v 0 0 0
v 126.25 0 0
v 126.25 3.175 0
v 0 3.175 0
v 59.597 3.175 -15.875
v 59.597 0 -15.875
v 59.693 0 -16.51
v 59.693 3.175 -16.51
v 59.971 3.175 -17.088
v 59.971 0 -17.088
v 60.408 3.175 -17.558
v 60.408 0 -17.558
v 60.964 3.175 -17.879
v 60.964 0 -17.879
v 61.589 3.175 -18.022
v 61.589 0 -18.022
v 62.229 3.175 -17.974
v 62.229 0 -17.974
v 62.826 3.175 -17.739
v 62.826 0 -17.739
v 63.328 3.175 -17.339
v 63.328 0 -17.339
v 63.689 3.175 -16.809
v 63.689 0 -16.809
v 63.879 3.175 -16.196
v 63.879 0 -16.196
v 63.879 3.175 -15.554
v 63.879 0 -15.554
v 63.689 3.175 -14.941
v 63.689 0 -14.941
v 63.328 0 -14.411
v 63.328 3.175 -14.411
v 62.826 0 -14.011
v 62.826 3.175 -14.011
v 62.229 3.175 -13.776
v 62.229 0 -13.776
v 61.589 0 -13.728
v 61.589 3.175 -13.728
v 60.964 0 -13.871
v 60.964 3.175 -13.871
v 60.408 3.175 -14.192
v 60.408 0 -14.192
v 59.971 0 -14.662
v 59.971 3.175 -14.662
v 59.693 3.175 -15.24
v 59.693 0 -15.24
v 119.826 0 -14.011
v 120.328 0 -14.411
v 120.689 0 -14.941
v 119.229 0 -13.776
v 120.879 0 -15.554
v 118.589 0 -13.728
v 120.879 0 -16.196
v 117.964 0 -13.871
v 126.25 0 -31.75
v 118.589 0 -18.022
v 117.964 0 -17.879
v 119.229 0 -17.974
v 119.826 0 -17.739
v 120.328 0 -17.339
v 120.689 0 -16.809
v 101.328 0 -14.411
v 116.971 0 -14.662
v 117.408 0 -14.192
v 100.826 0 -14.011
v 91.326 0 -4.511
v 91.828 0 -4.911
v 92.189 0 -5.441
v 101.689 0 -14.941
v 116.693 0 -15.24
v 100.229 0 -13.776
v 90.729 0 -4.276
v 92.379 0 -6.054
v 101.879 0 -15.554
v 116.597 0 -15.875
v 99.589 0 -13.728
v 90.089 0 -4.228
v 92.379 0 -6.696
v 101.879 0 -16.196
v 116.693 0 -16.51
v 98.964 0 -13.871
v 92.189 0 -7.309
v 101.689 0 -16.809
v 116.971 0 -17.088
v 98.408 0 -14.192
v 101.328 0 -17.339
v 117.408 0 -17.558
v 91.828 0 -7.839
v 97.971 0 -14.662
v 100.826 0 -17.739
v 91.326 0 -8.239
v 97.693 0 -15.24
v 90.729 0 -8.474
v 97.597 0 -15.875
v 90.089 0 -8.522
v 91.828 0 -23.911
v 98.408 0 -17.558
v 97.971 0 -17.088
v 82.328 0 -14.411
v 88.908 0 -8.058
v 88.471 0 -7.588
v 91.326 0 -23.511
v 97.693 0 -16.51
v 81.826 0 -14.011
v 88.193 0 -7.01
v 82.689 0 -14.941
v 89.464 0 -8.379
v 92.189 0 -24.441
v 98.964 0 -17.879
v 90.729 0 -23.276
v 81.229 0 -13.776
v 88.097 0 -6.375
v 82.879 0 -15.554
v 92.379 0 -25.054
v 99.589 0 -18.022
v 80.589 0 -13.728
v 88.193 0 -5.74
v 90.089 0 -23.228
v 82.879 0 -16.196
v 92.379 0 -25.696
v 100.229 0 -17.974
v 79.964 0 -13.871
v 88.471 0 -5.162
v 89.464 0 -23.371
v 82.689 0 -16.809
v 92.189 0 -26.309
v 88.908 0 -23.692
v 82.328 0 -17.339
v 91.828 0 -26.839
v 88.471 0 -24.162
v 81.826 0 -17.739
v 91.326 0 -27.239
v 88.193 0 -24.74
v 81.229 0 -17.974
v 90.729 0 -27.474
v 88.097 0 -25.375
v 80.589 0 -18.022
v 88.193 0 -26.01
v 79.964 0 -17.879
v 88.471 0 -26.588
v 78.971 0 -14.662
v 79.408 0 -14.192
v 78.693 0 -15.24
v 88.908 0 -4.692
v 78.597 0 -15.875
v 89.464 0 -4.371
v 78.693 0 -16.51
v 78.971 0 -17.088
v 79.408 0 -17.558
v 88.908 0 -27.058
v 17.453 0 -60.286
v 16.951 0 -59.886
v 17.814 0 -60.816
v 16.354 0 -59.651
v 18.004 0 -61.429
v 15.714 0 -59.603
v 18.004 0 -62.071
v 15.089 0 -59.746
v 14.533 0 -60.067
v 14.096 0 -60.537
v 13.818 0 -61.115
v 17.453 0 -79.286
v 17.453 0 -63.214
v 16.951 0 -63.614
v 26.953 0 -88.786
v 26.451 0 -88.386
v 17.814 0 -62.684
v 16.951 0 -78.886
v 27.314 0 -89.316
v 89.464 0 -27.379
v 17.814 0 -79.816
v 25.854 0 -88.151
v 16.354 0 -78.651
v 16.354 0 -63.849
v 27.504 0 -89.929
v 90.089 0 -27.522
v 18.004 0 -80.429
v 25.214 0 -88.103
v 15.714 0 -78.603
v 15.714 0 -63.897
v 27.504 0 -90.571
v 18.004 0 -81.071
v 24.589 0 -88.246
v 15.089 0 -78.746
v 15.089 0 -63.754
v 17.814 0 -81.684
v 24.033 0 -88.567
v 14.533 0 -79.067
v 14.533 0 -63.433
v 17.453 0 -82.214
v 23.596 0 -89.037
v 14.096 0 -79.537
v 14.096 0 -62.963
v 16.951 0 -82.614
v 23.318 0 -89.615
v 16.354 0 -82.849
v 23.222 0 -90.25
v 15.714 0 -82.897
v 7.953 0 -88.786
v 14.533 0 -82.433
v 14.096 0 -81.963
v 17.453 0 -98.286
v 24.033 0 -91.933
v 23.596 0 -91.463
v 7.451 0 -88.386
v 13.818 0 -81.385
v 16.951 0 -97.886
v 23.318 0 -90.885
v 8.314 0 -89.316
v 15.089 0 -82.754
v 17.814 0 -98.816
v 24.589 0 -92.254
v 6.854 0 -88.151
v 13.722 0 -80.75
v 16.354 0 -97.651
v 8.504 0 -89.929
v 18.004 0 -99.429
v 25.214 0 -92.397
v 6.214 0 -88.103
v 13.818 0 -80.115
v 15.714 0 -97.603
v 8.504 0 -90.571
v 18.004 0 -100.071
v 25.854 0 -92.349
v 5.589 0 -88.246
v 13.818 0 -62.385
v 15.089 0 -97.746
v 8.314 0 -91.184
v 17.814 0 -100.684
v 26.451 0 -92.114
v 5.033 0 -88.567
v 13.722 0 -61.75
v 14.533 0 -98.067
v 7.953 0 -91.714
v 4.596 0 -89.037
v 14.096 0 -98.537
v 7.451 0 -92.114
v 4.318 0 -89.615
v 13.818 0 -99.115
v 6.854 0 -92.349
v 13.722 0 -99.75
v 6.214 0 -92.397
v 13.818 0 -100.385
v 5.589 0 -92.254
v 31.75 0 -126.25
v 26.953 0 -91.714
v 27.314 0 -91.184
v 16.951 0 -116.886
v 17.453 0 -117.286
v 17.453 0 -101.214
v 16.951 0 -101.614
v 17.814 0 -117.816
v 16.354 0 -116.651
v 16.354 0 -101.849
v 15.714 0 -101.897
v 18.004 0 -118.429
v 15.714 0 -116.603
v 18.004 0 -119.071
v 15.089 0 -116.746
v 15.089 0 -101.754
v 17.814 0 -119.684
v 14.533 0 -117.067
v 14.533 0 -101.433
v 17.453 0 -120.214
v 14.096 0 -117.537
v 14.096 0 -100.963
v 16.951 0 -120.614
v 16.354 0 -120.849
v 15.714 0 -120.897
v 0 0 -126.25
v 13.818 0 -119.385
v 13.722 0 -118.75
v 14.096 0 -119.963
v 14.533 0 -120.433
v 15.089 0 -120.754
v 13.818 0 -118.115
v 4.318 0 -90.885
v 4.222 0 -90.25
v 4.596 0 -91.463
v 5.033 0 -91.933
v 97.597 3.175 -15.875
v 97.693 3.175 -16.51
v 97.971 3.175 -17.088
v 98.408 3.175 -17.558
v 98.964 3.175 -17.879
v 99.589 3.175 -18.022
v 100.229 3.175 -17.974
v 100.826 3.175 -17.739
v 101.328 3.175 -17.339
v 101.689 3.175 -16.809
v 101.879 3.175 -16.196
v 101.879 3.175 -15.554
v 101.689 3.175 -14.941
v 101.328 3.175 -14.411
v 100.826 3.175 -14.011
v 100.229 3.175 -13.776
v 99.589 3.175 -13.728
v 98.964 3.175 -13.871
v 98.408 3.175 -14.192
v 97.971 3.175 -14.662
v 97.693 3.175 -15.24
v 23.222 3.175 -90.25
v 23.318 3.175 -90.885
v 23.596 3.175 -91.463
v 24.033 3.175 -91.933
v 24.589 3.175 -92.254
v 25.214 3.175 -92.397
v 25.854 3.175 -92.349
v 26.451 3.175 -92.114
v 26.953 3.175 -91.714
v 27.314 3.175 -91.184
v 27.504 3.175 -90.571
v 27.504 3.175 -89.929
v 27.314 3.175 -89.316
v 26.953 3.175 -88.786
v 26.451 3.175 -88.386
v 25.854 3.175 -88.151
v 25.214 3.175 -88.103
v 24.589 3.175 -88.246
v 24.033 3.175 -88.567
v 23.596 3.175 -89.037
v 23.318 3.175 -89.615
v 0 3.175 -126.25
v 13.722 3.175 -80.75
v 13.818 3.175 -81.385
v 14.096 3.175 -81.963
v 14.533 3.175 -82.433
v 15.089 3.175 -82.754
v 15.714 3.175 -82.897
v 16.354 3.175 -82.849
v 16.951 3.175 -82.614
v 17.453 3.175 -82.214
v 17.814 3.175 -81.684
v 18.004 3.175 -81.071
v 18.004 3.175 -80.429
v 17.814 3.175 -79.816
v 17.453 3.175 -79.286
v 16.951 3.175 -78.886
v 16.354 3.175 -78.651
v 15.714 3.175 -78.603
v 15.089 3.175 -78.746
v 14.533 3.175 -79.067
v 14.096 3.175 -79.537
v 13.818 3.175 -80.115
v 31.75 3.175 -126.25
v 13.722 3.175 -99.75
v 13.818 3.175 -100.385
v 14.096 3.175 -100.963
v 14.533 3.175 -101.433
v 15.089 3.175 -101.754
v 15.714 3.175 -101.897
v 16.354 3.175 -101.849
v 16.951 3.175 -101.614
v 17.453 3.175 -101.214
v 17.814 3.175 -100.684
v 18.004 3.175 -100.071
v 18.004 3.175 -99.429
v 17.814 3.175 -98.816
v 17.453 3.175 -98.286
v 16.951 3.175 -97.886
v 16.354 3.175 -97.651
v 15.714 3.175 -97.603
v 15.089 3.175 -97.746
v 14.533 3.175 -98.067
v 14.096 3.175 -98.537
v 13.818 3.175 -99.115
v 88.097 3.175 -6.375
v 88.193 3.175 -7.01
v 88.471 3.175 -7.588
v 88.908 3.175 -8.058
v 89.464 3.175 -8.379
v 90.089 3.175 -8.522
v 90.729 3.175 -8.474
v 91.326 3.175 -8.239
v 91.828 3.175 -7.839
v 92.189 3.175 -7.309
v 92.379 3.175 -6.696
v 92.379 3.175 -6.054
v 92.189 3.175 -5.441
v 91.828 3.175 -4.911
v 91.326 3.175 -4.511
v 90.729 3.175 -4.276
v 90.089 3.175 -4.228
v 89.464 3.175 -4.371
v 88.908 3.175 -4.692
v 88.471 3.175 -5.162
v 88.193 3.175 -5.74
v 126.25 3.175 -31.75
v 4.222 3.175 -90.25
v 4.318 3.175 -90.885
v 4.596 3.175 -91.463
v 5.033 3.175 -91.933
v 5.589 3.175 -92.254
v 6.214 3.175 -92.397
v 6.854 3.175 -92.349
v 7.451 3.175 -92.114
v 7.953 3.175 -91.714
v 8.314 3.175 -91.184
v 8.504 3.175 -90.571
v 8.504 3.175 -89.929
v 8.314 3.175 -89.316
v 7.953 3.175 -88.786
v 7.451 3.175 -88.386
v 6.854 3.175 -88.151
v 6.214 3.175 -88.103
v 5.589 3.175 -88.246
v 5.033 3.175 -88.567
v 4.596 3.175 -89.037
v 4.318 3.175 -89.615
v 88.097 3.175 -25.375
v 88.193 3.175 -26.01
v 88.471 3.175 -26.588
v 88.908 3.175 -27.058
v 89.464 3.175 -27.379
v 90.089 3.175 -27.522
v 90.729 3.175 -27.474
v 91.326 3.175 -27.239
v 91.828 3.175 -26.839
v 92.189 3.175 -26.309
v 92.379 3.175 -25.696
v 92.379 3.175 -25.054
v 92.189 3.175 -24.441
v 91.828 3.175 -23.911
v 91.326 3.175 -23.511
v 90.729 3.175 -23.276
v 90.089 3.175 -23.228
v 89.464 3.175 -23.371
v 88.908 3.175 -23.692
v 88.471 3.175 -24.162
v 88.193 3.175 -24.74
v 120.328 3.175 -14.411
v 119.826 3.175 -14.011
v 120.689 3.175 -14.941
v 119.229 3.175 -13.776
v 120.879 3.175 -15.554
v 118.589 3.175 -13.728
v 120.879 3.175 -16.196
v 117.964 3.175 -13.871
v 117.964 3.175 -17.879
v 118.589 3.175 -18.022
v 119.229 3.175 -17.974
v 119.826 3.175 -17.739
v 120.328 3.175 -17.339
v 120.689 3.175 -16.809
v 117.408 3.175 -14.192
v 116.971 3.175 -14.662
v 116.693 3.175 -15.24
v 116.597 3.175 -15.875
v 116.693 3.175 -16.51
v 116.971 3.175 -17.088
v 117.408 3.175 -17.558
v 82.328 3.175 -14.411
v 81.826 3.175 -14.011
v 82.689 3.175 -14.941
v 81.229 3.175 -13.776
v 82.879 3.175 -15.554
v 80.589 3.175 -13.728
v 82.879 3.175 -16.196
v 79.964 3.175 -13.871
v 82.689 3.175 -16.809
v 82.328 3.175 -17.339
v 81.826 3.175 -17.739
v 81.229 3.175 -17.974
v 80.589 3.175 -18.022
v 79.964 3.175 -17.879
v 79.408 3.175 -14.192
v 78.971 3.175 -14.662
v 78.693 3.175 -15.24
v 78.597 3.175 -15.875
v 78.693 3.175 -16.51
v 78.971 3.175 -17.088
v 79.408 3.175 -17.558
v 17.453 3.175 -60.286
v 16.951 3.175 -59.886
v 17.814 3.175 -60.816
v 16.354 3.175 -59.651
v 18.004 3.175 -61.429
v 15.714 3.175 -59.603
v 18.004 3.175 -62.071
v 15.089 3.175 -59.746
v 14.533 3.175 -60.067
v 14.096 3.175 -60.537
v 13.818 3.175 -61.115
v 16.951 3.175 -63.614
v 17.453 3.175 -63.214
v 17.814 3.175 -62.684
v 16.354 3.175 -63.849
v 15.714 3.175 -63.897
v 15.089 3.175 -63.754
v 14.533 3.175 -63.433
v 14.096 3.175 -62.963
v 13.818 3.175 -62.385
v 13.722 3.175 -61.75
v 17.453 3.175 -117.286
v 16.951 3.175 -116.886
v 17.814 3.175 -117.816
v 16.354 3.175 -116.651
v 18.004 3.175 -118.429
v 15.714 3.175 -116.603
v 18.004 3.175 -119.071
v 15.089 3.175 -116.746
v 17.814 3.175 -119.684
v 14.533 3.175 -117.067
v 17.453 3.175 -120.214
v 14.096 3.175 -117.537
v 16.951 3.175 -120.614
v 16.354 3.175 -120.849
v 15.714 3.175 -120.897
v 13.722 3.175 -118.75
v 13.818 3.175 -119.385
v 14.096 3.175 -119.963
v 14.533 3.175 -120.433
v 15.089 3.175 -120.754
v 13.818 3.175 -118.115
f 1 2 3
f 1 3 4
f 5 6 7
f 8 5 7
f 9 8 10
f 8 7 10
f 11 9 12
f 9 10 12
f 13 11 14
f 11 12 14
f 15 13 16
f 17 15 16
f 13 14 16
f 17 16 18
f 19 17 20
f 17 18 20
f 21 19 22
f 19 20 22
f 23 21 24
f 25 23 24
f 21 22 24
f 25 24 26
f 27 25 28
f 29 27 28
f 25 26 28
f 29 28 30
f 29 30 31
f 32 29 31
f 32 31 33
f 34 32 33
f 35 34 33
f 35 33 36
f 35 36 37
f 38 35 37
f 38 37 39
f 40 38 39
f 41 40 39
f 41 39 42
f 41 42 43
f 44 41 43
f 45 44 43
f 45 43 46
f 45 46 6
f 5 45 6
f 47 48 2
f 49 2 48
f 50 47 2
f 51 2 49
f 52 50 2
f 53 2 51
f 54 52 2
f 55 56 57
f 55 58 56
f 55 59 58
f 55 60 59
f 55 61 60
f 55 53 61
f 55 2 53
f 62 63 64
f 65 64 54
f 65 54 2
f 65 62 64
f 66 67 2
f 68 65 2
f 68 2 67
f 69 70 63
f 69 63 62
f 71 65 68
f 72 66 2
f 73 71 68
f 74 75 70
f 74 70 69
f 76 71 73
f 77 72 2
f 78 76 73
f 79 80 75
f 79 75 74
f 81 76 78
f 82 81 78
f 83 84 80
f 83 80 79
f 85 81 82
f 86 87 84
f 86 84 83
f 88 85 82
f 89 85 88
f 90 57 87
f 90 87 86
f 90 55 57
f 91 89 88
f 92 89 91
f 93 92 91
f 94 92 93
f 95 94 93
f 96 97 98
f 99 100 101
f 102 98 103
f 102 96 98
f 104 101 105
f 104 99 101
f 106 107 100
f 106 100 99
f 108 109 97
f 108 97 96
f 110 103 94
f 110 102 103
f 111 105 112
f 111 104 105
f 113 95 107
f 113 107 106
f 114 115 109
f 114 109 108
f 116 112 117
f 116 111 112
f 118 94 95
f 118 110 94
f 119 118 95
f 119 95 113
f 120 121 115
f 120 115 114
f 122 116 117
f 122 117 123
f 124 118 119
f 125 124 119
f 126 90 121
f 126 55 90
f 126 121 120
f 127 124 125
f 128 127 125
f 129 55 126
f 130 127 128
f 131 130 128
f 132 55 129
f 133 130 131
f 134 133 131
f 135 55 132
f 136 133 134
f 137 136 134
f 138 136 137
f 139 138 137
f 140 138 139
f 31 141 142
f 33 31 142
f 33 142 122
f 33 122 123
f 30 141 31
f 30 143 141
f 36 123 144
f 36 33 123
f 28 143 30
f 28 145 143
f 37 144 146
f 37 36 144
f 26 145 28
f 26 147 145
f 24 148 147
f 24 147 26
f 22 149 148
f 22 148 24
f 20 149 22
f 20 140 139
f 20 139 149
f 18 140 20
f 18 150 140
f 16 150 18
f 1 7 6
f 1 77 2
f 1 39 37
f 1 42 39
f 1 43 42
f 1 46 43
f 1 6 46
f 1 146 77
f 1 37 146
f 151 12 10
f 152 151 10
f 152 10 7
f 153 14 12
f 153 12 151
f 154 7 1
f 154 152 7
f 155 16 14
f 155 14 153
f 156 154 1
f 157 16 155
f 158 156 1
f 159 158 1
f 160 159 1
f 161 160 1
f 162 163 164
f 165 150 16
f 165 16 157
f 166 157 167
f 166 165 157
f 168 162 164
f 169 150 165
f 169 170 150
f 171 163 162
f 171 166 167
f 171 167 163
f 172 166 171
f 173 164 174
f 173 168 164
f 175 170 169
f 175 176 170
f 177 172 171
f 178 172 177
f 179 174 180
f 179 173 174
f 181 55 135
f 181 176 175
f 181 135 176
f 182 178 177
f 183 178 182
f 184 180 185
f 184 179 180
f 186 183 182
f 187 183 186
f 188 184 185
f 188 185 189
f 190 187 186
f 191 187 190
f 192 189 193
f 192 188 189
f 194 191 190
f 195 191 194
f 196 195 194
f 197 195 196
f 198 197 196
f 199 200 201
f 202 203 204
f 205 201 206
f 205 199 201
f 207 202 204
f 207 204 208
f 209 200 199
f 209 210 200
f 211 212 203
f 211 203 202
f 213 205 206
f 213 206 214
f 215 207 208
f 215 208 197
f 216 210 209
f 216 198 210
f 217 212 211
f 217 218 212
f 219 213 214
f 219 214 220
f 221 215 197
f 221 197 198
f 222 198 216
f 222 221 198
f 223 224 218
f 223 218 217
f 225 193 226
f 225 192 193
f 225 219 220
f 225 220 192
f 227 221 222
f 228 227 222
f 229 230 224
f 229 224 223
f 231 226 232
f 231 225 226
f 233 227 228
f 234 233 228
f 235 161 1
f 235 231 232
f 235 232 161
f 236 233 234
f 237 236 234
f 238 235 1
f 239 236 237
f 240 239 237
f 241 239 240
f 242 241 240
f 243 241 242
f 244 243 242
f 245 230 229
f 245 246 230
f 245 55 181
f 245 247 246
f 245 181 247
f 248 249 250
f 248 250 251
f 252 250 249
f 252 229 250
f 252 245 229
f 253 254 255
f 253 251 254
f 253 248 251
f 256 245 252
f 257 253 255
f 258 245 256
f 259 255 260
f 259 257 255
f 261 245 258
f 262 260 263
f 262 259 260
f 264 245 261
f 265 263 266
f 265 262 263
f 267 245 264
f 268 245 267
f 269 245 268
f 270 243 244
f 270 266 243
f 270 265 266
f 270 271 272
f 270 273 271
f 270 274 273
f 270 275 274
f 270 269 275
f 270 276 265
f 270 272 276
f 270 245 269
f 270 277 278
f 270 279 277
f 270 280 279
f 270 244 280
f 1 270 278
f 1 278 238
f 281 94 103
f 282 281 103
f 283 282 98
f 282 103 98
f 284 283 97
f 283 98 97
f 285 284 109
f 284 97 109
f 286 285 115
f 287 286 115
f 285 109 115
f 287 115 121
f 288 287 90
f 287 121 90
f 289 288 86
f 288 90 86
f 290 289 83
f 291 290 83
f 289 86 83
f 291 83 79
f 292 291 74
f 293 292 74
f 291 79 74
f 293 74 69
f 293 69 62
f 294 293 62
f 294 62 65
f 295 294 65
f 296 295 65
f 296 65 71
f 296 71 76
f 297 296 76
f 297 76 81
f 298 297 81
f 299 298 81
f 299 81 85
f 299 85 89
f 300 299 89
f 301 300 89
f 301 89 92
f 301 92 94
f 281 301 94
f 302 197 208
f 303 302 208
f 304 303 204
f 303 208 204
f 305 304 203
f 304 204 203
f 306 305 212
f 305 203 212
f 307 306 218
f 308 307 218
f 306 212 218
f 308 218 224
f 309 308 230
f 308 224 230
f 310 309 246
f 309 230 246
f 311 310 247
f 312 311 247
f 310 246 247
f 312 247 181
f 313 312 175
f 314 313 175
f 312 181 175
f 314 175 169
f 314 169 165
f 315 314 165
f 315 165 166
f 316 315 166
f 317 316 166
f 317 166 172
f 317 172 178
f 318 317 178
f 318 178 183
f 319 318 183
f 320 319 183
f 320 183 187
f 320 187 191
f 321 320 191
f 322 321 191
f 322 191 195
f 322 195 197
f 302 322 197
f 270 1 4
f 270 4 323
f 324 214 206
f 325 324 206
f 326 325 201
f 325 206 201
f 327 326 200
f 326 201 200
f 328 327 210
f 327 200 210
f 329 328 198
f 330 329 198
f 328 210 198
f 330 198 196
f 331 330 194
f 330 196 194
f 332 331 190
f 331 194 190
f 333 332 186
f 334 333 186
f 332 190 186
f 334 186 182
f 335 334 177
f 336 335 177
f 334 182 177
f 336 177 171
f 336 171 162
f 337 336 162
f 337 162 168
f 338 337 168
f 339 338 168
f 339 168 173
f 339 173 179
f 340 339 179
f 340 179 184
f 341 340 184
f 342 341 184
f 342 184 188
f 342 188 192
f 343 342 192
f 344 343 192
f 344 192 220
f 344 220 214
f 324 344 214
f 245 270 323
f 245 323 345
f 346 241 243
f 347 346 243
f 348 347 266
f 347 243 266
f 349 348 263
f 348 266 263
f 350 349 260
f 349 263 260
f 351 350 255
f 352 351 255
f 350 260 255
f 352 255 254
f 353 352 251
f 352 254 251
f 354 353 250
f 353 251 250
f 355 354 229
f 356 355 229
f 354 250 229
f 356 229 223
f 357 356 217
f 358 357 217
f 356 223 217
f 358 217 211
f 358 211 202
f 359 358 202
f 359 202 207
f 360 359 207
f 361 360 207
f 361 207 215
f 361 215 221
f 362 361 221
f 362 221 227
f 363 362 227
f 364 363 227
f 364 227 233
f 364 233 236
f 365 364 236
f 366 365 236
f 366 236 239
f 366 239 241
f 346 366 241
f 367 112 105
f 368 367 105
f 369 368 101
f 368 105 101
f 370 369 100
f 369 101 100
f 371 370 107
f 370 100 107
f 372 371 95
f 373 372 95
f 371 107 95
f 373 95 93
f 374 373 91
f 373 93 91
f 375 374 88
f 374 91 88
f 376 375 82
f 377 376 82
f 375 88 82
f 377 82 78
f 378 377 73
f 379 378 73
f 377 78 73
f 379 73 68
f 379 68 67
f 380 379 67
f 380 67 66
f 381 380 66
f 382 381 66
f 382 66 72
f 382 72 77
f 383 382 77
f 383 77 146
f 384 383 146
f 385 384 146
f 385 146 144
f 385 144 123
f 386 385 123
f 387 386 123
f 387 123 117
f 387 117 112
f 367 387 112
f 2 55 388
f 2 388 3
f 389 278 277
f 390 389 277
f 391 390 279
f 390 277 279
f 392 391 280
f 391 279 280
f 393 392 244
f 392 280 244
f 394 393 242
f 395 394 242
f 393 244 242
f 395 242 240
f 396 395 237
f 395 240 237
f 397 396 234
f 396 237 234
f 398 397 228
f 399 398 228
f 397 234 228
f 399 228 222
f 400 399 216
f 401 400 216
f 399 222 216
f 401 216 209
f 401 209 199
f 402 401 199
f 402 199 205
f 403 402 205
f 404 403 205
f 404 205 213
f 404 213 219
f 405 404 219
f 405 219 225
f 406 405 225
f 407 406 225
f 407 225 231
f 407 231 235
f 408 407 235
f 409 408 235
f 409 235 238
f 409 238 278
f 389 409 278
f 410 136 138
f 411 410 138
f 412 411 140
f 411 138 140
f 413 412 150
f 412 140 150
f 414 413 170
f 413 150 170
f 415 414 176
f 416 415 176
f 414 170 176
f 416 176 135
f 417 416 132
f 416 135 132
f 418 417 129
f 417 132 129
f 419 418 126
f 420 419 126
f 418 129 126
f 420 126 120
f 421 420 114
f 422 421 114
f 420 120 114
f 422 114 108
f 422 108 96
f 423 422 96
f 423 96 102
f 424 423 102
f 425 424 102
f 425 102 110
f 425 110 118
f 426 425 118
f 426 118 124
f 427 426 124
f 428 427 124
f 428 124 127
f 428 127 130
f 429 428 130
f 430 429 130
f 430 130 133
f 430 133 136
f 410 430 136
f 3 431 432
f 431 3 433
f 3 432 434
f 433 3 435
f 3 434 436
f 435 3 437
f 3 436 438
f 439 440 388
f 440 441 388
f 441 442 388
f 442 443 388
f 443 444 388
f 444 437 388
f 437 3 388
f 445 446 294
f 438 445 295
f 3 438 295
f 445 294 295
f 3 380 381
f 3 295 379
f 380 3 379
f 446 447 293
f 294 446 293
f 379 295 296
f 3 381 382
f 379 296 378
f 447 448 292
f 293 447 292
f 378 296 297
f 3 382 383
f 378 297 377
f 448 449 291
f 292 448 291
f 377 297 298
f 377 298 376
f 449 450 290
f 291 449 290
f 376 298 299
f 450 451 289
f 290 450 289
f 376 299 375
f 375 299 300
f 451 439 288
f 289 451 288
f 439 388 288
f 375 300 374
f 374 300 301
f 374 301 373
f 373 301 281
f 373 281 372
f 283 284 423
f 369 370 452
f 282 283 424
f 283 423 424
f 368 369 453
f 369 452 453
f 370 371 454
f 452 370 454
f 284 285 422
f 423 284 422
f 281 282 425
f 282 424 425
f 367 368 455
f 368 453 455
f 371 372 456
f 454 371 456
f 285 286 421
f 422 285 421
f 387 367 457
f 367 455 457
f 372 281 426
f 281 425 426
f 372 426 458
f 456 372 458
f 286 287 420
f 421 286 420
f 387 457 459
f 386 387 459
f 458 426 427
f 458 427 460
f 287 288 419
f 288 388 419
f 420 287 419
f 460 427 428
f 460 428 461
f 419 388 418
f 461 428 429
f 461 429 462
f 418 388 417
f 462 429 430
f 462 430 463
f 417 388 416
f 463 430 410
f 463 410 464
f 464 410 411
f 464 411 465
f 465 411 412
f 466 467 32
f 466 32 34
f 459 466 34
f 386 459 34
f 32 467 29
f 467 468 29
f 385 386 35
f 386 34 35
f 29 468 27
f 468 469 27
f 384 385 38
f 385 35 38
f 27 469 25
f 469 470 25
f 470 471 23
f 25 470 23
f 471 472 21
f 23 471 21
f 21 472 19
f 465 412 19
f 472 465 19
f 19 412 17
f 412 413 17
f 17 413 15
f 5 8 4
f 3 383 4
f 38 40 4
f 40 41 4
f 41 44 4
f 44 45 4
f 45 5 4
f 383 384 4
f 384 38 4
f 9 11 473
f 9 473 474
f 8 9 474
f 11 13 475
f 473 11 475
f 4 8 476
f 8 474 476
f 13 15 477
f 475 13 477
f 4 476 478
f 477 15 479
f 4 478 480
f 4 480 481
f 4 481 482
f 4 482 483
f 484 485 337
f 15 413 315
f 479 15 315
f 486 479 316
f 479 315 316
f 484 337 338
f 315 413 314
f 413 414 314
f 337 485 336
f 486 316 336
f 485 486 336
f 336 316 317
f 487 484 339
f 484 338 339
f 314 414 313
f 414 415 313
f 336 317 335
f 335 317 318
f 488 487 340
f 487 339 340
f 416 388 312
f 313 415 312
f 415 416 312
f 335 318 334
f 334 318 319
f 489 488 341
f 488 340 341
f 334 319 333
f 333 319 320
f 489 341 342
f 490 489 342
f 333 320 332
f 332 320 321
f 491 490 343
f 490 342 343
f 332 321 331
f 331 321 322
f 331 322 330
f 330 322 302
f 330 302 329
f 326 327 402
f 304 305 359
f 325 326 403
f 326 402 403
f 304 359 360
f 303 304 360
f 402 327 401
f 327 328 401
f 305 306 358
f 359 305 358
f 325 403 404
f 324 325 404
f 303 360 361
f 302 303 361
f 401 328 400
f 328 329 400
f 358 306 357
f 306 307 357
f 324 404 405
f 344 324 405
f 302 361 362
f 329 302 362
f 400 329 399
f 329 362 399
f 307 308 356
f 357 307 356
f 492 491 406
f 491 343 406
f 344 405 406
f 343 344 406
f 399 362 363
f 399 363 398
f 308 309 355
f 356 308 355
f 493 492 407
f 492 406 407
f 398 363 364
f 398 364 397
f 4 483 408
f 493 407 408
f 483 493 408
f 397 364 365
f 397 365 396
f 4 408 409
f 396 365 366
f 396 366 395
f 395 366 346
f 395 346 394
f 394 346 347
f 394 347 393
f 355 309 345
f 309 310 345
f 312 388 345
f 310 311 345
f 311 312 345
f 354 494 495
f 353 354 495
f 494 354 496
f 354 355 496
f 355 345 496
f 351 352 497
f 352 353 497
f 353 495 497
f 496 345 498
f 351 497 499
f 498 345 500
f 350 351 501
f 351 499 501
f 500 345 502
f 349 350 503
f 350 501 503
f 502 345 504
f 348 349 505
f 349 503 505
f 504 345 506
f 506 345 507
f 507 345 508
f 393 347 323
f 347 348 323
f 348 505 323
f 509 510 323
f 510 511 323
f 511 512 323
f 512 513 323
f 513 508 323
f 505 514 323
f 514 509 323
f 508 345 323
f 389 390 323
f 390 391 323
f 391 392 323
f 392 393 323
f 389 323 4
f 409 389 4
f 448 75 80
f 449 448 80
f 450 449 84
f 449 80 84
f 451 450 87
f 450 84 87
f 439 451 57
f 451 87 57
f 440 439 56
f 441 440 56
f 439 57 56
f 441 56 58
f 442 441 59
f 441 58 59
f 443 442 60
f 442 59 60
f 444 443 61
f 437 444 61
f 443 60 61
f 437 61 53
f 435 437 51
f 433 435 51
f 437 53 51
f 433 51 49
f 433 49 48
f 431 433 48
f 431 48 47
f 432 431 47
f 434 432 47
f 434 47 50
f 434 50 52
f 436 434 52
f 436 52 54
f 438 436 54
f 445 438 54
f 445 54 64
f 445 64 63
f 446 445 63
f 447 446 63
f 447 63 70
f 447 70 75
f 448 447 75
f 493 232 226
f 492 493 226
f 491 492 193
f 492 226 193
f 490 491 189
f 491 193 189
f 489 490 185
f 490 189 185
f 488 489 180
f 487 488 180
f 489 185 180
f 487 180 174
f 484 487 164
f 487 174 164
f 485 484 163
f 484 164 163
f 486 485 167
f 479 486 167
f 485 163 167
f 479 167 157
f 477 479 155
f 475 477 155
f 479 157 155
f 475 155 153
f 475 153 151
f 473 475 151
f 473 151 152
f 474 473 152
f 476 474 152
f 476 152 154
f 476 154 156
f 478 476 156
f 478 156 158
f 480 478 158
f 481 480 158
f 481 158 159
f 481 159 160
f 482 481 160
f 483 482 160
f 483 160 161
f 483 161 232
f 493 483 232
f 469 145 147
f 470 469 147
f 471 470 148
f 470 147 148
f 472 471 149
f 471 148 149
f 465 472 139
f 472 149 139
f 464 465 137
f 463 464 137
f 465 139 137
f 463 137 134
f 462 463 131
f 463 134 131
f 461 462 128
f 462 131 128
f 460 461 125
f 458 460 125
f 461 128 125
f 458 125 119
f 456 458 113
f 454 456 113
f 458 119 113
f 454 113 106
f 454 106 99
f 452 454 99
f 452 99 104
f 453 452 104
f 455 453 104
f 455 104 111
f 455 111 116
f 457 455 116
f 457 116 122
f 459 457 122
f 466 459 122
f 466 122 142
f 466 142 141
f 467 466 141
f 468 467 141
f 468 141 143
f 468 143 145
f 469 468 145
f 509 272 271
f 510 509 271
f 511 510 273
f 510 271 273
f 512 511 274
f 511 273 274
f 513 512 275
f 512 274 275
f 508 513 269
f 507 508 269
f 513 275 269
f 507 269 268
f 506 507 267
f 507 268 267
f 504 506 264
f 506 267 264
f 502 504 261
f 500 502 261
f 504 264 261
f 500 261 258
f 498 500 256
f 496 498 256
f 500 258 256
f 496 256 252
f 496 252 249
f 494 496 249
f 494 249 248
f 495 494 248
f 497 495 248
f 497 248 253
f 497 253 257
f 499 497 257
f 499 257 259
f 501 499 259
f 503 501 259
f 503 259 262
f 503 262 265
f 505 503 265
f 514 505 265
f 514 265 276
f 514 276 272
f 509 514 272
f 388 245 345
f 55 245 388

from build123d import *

# Parameters (mm, degrees)
BOSS_EXTRUDE1_DEPTH   = 3.175
F_8_CLEARANCE_HOLE1_D = 4.3053


with BuildPart() as part:
    # Sketch1 → Boss-Extrude1 (new body)
    with BuildSketch(Plane(origin=(0, 0, 0), x_dir=(1, 0, 0), z_dir=(0, 1, 0))):
        Polygon((126.25, 0), (0, 0), (0, 126.25), (31.75, 126.25), (126.25, 31.75), align=None)
    extrude(amount=BOSS_EXTRUDE1_DEPTH)

    # #8 Clearance Hole1 (through all)
    with Locations(Plane(origin=(0, 3.175, 0), x_dir=(1, 0, 0), z_dir=(0, 1, 0))):
        with Locations((15.875, 61.75), (15.875, 80.75), (6.375, 90.25), (25.375, 90.25), (15.875, 99.75), (15.875, 118.75), (118.75, 15.875), (99.75, 15.875), (90.25, 25.375), (90.25, 6.375), (80.75, 15.875), (61.75, 15.875)):
            Hole(F_8_CLEARANCE_HOLE1_D / 2)


solid = part.part
